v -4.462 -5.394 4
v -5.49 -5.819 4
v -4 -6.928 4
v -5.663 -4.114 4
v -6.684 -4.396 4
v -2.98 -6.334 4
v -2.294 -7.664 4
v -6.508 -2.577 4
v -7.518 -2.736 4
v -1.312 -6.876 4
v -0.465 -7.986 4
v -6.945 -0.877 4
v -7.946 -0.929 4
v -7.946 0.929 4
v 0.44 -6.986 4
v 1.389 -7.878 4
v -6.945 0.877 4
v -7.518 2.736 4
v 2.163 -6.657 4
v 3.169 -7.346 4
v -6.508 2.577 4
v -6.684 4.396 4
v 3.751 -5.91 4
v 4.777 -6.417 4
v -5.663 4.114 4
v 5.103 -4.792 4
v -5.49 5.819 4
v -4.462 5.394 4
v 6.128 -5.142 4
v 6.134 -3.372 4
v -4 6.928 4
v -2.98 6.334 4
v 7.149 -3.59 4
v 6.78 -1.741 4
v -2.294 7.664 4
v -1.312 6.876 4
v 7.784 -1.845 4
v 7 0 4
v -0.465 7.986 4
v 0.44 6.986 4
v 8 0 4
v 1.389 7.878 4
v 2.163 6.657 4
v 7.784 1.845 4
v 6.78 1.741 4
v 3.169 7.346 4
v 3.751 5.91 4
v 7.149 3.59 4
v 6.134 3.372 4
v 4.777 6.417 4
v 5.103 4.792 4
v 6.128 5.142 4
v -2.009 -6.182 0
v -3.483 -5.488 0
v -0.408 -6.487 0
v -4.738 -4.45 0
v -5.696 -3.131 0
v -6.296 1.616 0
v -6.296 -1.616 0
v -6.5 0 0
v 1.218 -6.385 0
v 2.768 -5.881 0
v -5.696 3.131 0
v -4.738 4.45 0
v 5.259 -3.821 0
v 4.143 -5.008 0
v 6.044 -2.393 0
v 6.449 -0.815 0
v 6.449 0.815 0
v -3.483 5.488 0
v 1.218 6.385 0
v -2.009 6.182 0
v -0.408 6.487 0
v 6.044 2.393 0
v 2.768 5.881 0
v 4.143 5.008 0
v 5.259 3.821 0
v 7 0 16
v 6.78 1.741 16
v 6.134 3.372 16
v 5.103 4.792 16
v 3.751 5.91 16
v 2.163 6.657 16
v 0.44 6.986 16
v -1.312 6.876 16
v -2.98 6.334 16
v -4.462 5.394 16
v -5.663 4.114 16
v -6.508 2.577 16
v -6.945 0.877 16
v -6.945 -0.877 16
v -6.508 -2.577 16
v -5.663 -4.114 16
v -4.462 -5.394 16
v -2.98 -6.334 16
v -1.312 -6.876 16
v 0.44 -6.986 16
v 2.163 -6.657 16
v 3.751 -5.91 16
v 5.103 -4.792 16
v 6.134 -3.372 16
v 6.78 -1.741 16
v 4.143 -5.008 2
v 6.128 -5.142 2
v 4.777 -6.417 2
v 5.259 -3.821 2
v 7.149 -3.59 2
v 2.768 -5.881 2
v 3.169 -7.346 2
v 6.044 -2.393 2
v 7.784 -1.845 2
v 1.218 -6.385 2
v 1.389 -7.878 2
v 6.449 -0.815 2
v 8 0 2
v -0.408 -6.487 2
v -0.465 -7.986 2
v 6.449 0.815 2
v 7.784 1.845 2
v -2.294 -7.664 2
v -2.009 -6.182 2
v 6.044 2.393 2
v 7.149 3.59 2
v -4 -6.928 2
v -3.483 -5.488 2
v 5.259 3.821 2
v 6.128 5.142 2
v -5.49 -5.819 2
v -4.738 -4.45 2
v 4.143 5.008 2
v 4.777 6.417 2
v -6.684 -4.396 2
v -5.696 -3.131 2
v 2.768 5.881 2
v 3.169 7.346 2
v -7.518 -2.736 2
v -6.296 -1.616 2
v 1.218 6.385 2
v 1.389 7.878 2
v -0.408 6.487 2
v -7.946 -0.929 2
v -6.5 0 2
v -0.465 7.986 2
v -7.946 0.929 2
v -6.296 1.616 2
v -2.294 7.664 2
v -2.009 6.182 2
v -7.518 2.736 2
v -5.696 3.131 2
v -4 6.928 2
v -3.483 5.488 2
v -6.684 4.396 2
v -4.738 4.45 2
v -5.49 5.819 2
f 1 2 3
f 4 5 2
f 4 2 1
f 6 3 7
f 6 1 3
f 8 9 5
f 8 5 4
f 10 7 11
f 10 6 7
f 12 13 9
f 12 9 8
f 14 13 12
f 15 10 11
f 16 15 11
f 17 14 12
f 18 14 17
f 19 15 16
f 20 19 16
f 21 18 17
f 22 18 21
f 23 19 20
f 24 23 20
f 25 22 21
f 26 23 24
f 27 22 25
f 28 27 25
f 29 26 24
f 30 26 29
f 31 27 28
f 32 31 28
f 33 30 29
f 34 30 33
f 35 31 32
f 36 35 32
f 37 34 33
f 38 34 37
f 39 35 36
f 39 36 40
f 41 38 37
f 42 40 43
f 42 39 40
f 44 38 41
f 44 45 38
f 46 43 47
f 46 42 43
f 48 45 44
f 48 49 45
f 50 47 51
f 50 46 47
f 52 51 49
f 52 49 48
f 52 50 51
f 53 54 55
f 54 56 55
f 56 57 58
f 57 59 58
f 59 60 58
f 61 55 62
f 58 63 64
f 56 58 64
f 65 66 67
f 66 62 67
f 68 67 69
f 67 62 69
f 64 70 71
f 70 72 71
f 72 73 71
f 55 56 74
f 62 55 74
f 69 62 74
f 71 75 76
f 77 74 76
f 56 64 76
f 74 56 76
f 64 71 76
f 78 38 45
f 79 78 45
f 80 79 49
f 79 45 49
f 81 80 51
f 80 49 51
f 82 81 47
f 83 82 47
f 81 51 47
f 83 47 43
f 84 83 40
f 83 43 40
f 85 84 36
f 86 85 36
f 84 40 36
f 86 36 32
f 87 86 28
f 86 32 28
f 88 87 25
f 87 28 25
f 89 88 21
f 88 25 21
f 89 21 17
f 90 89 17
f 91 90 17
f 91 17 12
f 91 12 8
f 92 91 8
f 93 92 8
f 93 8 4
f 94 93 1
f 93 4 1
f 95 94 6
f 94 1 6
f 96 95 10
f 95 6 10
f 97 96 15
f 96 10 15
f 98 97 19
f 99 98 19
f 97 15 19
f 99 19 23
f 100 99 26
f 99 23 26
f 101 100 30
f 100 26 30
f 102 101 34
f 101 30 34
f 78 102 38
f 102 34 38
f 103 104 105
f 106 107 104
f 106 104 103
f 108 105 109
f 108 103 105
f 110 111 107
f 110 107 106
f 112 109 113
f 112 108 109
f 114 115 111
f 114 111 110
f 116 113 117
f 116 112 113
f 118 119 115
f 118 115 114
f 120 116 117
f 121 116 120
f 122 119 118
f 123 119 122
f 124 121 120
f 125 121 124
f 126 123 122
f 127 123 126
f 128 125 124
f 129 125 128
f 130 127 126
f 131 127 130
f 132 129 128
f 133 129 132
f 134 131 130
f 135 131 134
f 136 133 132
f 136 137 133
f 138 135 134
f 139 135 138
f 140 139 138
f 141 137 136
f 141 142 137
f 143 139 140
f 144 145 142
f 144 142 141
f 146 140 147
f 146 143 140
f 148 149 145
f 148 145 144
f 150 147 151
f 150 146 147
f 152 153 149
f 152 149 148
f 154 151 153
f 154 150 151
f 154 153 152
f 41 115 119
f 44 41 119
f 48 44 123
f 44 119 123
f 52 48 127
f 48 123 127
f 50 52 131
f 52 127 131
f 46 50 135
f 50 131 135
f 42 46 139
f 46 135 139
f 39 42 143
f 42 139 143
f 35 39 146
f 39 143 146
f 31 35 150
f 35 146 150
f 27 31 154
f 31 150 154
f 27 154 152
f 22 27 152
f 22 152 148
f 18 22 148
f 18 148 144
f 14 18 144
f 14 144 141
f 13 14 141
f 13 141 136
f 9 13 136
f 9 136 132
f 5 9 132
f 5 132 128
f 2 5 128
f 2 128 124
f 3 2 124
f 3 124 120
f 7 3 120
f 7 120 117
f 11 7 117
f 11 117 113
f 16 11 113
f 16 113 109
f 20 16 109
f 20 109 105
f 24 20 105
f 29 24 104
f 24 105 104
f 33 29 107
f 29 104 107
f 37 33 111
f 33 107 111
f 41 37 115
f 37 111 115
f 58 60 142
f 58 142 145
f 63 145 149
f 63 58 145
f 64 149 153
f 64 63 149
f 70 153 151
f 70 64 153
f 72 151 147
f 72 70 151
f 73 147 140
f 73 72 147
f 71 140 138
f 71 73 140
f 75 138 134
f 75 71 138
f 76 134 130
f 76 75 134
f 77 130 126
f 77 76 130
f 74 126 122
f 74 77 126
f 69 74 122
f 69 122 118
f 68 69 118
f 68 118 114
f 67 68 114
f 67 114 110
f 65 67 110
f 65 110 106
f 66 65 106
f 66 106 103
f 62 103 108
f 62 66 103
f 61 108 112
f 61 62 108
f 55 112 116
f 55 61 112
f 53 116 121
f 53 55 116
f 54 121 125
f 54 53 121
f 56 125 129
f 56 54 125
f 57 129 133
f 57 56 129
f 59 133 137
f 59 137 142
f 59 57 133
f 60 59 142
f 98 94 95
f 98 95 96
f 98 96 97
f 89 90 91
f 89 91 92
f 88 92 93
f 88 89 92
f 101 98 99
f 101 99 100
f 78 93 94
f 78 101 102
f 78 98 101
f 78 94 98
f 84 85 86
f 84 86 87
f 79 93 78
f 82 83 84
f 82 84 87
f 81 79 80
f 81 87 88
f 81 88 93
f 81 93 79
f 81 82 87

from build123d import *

# Parameters (mm, degrees)
SZKIC1_R                    = 8
DODANIE_WYCI_GNI_CIE1_DEPTH = 16
WYTNIJ_WYCI_GNI_CIE1_START  = -12
SZKIC2_R                    = 8
SZKIC2_R_2                  = 7
WYTNIJ_WYCI_GNI_CIE1_DEPTH  = 12
SZKIC3_R                    = 8
SZKIC3_R_2                  = 6.5
WYTNIJ_WYCI_GNI_CIE2_DEPTH  = 2


with BuildPart() as part:
    # Szkic1 → Dodanie-wyciągnięcie1 (new body)
    with BuildSketch(Plane.XY):
        Circle(SZKIC1_R)
    extrude(amount=DODANIE_WYCI_GNI_CIE1_DEPTH)

    # Szkic2 → Wytnij-wyciągnięcie1 (cut)
    with BuildSketch(Plane.XY.offset(16).offset(WYTNIJ_WYCI_GNI_CIE1_START)):
        Circle(SZKIC2_R)
        Circle(SZKIC2_R_2, mode=Mode.SUBTRACT)
    extrude(amount=WYTNIJ_WYCI_GNI_CIE1_DEPTH, mode=Mode.SUBTRACT)

    # Szkic3 → Wytnij-wyciągnięcie2 (cut)
    with BuildSketch(Plane(origin=(0, 0, 0), x_dir=(-1, 0, 0), z_dir=(0, 0, -1))):
        Circle(SZKIC3_R)
        Circle(SZKIC3_R_2, mode=Mode.SUBTRACT)
    extrude(amount=-WYTNIJ_WYCI_GNI_CIE2_DEPTH, mode=Mode.SUBTRACT)


solid = part.part
